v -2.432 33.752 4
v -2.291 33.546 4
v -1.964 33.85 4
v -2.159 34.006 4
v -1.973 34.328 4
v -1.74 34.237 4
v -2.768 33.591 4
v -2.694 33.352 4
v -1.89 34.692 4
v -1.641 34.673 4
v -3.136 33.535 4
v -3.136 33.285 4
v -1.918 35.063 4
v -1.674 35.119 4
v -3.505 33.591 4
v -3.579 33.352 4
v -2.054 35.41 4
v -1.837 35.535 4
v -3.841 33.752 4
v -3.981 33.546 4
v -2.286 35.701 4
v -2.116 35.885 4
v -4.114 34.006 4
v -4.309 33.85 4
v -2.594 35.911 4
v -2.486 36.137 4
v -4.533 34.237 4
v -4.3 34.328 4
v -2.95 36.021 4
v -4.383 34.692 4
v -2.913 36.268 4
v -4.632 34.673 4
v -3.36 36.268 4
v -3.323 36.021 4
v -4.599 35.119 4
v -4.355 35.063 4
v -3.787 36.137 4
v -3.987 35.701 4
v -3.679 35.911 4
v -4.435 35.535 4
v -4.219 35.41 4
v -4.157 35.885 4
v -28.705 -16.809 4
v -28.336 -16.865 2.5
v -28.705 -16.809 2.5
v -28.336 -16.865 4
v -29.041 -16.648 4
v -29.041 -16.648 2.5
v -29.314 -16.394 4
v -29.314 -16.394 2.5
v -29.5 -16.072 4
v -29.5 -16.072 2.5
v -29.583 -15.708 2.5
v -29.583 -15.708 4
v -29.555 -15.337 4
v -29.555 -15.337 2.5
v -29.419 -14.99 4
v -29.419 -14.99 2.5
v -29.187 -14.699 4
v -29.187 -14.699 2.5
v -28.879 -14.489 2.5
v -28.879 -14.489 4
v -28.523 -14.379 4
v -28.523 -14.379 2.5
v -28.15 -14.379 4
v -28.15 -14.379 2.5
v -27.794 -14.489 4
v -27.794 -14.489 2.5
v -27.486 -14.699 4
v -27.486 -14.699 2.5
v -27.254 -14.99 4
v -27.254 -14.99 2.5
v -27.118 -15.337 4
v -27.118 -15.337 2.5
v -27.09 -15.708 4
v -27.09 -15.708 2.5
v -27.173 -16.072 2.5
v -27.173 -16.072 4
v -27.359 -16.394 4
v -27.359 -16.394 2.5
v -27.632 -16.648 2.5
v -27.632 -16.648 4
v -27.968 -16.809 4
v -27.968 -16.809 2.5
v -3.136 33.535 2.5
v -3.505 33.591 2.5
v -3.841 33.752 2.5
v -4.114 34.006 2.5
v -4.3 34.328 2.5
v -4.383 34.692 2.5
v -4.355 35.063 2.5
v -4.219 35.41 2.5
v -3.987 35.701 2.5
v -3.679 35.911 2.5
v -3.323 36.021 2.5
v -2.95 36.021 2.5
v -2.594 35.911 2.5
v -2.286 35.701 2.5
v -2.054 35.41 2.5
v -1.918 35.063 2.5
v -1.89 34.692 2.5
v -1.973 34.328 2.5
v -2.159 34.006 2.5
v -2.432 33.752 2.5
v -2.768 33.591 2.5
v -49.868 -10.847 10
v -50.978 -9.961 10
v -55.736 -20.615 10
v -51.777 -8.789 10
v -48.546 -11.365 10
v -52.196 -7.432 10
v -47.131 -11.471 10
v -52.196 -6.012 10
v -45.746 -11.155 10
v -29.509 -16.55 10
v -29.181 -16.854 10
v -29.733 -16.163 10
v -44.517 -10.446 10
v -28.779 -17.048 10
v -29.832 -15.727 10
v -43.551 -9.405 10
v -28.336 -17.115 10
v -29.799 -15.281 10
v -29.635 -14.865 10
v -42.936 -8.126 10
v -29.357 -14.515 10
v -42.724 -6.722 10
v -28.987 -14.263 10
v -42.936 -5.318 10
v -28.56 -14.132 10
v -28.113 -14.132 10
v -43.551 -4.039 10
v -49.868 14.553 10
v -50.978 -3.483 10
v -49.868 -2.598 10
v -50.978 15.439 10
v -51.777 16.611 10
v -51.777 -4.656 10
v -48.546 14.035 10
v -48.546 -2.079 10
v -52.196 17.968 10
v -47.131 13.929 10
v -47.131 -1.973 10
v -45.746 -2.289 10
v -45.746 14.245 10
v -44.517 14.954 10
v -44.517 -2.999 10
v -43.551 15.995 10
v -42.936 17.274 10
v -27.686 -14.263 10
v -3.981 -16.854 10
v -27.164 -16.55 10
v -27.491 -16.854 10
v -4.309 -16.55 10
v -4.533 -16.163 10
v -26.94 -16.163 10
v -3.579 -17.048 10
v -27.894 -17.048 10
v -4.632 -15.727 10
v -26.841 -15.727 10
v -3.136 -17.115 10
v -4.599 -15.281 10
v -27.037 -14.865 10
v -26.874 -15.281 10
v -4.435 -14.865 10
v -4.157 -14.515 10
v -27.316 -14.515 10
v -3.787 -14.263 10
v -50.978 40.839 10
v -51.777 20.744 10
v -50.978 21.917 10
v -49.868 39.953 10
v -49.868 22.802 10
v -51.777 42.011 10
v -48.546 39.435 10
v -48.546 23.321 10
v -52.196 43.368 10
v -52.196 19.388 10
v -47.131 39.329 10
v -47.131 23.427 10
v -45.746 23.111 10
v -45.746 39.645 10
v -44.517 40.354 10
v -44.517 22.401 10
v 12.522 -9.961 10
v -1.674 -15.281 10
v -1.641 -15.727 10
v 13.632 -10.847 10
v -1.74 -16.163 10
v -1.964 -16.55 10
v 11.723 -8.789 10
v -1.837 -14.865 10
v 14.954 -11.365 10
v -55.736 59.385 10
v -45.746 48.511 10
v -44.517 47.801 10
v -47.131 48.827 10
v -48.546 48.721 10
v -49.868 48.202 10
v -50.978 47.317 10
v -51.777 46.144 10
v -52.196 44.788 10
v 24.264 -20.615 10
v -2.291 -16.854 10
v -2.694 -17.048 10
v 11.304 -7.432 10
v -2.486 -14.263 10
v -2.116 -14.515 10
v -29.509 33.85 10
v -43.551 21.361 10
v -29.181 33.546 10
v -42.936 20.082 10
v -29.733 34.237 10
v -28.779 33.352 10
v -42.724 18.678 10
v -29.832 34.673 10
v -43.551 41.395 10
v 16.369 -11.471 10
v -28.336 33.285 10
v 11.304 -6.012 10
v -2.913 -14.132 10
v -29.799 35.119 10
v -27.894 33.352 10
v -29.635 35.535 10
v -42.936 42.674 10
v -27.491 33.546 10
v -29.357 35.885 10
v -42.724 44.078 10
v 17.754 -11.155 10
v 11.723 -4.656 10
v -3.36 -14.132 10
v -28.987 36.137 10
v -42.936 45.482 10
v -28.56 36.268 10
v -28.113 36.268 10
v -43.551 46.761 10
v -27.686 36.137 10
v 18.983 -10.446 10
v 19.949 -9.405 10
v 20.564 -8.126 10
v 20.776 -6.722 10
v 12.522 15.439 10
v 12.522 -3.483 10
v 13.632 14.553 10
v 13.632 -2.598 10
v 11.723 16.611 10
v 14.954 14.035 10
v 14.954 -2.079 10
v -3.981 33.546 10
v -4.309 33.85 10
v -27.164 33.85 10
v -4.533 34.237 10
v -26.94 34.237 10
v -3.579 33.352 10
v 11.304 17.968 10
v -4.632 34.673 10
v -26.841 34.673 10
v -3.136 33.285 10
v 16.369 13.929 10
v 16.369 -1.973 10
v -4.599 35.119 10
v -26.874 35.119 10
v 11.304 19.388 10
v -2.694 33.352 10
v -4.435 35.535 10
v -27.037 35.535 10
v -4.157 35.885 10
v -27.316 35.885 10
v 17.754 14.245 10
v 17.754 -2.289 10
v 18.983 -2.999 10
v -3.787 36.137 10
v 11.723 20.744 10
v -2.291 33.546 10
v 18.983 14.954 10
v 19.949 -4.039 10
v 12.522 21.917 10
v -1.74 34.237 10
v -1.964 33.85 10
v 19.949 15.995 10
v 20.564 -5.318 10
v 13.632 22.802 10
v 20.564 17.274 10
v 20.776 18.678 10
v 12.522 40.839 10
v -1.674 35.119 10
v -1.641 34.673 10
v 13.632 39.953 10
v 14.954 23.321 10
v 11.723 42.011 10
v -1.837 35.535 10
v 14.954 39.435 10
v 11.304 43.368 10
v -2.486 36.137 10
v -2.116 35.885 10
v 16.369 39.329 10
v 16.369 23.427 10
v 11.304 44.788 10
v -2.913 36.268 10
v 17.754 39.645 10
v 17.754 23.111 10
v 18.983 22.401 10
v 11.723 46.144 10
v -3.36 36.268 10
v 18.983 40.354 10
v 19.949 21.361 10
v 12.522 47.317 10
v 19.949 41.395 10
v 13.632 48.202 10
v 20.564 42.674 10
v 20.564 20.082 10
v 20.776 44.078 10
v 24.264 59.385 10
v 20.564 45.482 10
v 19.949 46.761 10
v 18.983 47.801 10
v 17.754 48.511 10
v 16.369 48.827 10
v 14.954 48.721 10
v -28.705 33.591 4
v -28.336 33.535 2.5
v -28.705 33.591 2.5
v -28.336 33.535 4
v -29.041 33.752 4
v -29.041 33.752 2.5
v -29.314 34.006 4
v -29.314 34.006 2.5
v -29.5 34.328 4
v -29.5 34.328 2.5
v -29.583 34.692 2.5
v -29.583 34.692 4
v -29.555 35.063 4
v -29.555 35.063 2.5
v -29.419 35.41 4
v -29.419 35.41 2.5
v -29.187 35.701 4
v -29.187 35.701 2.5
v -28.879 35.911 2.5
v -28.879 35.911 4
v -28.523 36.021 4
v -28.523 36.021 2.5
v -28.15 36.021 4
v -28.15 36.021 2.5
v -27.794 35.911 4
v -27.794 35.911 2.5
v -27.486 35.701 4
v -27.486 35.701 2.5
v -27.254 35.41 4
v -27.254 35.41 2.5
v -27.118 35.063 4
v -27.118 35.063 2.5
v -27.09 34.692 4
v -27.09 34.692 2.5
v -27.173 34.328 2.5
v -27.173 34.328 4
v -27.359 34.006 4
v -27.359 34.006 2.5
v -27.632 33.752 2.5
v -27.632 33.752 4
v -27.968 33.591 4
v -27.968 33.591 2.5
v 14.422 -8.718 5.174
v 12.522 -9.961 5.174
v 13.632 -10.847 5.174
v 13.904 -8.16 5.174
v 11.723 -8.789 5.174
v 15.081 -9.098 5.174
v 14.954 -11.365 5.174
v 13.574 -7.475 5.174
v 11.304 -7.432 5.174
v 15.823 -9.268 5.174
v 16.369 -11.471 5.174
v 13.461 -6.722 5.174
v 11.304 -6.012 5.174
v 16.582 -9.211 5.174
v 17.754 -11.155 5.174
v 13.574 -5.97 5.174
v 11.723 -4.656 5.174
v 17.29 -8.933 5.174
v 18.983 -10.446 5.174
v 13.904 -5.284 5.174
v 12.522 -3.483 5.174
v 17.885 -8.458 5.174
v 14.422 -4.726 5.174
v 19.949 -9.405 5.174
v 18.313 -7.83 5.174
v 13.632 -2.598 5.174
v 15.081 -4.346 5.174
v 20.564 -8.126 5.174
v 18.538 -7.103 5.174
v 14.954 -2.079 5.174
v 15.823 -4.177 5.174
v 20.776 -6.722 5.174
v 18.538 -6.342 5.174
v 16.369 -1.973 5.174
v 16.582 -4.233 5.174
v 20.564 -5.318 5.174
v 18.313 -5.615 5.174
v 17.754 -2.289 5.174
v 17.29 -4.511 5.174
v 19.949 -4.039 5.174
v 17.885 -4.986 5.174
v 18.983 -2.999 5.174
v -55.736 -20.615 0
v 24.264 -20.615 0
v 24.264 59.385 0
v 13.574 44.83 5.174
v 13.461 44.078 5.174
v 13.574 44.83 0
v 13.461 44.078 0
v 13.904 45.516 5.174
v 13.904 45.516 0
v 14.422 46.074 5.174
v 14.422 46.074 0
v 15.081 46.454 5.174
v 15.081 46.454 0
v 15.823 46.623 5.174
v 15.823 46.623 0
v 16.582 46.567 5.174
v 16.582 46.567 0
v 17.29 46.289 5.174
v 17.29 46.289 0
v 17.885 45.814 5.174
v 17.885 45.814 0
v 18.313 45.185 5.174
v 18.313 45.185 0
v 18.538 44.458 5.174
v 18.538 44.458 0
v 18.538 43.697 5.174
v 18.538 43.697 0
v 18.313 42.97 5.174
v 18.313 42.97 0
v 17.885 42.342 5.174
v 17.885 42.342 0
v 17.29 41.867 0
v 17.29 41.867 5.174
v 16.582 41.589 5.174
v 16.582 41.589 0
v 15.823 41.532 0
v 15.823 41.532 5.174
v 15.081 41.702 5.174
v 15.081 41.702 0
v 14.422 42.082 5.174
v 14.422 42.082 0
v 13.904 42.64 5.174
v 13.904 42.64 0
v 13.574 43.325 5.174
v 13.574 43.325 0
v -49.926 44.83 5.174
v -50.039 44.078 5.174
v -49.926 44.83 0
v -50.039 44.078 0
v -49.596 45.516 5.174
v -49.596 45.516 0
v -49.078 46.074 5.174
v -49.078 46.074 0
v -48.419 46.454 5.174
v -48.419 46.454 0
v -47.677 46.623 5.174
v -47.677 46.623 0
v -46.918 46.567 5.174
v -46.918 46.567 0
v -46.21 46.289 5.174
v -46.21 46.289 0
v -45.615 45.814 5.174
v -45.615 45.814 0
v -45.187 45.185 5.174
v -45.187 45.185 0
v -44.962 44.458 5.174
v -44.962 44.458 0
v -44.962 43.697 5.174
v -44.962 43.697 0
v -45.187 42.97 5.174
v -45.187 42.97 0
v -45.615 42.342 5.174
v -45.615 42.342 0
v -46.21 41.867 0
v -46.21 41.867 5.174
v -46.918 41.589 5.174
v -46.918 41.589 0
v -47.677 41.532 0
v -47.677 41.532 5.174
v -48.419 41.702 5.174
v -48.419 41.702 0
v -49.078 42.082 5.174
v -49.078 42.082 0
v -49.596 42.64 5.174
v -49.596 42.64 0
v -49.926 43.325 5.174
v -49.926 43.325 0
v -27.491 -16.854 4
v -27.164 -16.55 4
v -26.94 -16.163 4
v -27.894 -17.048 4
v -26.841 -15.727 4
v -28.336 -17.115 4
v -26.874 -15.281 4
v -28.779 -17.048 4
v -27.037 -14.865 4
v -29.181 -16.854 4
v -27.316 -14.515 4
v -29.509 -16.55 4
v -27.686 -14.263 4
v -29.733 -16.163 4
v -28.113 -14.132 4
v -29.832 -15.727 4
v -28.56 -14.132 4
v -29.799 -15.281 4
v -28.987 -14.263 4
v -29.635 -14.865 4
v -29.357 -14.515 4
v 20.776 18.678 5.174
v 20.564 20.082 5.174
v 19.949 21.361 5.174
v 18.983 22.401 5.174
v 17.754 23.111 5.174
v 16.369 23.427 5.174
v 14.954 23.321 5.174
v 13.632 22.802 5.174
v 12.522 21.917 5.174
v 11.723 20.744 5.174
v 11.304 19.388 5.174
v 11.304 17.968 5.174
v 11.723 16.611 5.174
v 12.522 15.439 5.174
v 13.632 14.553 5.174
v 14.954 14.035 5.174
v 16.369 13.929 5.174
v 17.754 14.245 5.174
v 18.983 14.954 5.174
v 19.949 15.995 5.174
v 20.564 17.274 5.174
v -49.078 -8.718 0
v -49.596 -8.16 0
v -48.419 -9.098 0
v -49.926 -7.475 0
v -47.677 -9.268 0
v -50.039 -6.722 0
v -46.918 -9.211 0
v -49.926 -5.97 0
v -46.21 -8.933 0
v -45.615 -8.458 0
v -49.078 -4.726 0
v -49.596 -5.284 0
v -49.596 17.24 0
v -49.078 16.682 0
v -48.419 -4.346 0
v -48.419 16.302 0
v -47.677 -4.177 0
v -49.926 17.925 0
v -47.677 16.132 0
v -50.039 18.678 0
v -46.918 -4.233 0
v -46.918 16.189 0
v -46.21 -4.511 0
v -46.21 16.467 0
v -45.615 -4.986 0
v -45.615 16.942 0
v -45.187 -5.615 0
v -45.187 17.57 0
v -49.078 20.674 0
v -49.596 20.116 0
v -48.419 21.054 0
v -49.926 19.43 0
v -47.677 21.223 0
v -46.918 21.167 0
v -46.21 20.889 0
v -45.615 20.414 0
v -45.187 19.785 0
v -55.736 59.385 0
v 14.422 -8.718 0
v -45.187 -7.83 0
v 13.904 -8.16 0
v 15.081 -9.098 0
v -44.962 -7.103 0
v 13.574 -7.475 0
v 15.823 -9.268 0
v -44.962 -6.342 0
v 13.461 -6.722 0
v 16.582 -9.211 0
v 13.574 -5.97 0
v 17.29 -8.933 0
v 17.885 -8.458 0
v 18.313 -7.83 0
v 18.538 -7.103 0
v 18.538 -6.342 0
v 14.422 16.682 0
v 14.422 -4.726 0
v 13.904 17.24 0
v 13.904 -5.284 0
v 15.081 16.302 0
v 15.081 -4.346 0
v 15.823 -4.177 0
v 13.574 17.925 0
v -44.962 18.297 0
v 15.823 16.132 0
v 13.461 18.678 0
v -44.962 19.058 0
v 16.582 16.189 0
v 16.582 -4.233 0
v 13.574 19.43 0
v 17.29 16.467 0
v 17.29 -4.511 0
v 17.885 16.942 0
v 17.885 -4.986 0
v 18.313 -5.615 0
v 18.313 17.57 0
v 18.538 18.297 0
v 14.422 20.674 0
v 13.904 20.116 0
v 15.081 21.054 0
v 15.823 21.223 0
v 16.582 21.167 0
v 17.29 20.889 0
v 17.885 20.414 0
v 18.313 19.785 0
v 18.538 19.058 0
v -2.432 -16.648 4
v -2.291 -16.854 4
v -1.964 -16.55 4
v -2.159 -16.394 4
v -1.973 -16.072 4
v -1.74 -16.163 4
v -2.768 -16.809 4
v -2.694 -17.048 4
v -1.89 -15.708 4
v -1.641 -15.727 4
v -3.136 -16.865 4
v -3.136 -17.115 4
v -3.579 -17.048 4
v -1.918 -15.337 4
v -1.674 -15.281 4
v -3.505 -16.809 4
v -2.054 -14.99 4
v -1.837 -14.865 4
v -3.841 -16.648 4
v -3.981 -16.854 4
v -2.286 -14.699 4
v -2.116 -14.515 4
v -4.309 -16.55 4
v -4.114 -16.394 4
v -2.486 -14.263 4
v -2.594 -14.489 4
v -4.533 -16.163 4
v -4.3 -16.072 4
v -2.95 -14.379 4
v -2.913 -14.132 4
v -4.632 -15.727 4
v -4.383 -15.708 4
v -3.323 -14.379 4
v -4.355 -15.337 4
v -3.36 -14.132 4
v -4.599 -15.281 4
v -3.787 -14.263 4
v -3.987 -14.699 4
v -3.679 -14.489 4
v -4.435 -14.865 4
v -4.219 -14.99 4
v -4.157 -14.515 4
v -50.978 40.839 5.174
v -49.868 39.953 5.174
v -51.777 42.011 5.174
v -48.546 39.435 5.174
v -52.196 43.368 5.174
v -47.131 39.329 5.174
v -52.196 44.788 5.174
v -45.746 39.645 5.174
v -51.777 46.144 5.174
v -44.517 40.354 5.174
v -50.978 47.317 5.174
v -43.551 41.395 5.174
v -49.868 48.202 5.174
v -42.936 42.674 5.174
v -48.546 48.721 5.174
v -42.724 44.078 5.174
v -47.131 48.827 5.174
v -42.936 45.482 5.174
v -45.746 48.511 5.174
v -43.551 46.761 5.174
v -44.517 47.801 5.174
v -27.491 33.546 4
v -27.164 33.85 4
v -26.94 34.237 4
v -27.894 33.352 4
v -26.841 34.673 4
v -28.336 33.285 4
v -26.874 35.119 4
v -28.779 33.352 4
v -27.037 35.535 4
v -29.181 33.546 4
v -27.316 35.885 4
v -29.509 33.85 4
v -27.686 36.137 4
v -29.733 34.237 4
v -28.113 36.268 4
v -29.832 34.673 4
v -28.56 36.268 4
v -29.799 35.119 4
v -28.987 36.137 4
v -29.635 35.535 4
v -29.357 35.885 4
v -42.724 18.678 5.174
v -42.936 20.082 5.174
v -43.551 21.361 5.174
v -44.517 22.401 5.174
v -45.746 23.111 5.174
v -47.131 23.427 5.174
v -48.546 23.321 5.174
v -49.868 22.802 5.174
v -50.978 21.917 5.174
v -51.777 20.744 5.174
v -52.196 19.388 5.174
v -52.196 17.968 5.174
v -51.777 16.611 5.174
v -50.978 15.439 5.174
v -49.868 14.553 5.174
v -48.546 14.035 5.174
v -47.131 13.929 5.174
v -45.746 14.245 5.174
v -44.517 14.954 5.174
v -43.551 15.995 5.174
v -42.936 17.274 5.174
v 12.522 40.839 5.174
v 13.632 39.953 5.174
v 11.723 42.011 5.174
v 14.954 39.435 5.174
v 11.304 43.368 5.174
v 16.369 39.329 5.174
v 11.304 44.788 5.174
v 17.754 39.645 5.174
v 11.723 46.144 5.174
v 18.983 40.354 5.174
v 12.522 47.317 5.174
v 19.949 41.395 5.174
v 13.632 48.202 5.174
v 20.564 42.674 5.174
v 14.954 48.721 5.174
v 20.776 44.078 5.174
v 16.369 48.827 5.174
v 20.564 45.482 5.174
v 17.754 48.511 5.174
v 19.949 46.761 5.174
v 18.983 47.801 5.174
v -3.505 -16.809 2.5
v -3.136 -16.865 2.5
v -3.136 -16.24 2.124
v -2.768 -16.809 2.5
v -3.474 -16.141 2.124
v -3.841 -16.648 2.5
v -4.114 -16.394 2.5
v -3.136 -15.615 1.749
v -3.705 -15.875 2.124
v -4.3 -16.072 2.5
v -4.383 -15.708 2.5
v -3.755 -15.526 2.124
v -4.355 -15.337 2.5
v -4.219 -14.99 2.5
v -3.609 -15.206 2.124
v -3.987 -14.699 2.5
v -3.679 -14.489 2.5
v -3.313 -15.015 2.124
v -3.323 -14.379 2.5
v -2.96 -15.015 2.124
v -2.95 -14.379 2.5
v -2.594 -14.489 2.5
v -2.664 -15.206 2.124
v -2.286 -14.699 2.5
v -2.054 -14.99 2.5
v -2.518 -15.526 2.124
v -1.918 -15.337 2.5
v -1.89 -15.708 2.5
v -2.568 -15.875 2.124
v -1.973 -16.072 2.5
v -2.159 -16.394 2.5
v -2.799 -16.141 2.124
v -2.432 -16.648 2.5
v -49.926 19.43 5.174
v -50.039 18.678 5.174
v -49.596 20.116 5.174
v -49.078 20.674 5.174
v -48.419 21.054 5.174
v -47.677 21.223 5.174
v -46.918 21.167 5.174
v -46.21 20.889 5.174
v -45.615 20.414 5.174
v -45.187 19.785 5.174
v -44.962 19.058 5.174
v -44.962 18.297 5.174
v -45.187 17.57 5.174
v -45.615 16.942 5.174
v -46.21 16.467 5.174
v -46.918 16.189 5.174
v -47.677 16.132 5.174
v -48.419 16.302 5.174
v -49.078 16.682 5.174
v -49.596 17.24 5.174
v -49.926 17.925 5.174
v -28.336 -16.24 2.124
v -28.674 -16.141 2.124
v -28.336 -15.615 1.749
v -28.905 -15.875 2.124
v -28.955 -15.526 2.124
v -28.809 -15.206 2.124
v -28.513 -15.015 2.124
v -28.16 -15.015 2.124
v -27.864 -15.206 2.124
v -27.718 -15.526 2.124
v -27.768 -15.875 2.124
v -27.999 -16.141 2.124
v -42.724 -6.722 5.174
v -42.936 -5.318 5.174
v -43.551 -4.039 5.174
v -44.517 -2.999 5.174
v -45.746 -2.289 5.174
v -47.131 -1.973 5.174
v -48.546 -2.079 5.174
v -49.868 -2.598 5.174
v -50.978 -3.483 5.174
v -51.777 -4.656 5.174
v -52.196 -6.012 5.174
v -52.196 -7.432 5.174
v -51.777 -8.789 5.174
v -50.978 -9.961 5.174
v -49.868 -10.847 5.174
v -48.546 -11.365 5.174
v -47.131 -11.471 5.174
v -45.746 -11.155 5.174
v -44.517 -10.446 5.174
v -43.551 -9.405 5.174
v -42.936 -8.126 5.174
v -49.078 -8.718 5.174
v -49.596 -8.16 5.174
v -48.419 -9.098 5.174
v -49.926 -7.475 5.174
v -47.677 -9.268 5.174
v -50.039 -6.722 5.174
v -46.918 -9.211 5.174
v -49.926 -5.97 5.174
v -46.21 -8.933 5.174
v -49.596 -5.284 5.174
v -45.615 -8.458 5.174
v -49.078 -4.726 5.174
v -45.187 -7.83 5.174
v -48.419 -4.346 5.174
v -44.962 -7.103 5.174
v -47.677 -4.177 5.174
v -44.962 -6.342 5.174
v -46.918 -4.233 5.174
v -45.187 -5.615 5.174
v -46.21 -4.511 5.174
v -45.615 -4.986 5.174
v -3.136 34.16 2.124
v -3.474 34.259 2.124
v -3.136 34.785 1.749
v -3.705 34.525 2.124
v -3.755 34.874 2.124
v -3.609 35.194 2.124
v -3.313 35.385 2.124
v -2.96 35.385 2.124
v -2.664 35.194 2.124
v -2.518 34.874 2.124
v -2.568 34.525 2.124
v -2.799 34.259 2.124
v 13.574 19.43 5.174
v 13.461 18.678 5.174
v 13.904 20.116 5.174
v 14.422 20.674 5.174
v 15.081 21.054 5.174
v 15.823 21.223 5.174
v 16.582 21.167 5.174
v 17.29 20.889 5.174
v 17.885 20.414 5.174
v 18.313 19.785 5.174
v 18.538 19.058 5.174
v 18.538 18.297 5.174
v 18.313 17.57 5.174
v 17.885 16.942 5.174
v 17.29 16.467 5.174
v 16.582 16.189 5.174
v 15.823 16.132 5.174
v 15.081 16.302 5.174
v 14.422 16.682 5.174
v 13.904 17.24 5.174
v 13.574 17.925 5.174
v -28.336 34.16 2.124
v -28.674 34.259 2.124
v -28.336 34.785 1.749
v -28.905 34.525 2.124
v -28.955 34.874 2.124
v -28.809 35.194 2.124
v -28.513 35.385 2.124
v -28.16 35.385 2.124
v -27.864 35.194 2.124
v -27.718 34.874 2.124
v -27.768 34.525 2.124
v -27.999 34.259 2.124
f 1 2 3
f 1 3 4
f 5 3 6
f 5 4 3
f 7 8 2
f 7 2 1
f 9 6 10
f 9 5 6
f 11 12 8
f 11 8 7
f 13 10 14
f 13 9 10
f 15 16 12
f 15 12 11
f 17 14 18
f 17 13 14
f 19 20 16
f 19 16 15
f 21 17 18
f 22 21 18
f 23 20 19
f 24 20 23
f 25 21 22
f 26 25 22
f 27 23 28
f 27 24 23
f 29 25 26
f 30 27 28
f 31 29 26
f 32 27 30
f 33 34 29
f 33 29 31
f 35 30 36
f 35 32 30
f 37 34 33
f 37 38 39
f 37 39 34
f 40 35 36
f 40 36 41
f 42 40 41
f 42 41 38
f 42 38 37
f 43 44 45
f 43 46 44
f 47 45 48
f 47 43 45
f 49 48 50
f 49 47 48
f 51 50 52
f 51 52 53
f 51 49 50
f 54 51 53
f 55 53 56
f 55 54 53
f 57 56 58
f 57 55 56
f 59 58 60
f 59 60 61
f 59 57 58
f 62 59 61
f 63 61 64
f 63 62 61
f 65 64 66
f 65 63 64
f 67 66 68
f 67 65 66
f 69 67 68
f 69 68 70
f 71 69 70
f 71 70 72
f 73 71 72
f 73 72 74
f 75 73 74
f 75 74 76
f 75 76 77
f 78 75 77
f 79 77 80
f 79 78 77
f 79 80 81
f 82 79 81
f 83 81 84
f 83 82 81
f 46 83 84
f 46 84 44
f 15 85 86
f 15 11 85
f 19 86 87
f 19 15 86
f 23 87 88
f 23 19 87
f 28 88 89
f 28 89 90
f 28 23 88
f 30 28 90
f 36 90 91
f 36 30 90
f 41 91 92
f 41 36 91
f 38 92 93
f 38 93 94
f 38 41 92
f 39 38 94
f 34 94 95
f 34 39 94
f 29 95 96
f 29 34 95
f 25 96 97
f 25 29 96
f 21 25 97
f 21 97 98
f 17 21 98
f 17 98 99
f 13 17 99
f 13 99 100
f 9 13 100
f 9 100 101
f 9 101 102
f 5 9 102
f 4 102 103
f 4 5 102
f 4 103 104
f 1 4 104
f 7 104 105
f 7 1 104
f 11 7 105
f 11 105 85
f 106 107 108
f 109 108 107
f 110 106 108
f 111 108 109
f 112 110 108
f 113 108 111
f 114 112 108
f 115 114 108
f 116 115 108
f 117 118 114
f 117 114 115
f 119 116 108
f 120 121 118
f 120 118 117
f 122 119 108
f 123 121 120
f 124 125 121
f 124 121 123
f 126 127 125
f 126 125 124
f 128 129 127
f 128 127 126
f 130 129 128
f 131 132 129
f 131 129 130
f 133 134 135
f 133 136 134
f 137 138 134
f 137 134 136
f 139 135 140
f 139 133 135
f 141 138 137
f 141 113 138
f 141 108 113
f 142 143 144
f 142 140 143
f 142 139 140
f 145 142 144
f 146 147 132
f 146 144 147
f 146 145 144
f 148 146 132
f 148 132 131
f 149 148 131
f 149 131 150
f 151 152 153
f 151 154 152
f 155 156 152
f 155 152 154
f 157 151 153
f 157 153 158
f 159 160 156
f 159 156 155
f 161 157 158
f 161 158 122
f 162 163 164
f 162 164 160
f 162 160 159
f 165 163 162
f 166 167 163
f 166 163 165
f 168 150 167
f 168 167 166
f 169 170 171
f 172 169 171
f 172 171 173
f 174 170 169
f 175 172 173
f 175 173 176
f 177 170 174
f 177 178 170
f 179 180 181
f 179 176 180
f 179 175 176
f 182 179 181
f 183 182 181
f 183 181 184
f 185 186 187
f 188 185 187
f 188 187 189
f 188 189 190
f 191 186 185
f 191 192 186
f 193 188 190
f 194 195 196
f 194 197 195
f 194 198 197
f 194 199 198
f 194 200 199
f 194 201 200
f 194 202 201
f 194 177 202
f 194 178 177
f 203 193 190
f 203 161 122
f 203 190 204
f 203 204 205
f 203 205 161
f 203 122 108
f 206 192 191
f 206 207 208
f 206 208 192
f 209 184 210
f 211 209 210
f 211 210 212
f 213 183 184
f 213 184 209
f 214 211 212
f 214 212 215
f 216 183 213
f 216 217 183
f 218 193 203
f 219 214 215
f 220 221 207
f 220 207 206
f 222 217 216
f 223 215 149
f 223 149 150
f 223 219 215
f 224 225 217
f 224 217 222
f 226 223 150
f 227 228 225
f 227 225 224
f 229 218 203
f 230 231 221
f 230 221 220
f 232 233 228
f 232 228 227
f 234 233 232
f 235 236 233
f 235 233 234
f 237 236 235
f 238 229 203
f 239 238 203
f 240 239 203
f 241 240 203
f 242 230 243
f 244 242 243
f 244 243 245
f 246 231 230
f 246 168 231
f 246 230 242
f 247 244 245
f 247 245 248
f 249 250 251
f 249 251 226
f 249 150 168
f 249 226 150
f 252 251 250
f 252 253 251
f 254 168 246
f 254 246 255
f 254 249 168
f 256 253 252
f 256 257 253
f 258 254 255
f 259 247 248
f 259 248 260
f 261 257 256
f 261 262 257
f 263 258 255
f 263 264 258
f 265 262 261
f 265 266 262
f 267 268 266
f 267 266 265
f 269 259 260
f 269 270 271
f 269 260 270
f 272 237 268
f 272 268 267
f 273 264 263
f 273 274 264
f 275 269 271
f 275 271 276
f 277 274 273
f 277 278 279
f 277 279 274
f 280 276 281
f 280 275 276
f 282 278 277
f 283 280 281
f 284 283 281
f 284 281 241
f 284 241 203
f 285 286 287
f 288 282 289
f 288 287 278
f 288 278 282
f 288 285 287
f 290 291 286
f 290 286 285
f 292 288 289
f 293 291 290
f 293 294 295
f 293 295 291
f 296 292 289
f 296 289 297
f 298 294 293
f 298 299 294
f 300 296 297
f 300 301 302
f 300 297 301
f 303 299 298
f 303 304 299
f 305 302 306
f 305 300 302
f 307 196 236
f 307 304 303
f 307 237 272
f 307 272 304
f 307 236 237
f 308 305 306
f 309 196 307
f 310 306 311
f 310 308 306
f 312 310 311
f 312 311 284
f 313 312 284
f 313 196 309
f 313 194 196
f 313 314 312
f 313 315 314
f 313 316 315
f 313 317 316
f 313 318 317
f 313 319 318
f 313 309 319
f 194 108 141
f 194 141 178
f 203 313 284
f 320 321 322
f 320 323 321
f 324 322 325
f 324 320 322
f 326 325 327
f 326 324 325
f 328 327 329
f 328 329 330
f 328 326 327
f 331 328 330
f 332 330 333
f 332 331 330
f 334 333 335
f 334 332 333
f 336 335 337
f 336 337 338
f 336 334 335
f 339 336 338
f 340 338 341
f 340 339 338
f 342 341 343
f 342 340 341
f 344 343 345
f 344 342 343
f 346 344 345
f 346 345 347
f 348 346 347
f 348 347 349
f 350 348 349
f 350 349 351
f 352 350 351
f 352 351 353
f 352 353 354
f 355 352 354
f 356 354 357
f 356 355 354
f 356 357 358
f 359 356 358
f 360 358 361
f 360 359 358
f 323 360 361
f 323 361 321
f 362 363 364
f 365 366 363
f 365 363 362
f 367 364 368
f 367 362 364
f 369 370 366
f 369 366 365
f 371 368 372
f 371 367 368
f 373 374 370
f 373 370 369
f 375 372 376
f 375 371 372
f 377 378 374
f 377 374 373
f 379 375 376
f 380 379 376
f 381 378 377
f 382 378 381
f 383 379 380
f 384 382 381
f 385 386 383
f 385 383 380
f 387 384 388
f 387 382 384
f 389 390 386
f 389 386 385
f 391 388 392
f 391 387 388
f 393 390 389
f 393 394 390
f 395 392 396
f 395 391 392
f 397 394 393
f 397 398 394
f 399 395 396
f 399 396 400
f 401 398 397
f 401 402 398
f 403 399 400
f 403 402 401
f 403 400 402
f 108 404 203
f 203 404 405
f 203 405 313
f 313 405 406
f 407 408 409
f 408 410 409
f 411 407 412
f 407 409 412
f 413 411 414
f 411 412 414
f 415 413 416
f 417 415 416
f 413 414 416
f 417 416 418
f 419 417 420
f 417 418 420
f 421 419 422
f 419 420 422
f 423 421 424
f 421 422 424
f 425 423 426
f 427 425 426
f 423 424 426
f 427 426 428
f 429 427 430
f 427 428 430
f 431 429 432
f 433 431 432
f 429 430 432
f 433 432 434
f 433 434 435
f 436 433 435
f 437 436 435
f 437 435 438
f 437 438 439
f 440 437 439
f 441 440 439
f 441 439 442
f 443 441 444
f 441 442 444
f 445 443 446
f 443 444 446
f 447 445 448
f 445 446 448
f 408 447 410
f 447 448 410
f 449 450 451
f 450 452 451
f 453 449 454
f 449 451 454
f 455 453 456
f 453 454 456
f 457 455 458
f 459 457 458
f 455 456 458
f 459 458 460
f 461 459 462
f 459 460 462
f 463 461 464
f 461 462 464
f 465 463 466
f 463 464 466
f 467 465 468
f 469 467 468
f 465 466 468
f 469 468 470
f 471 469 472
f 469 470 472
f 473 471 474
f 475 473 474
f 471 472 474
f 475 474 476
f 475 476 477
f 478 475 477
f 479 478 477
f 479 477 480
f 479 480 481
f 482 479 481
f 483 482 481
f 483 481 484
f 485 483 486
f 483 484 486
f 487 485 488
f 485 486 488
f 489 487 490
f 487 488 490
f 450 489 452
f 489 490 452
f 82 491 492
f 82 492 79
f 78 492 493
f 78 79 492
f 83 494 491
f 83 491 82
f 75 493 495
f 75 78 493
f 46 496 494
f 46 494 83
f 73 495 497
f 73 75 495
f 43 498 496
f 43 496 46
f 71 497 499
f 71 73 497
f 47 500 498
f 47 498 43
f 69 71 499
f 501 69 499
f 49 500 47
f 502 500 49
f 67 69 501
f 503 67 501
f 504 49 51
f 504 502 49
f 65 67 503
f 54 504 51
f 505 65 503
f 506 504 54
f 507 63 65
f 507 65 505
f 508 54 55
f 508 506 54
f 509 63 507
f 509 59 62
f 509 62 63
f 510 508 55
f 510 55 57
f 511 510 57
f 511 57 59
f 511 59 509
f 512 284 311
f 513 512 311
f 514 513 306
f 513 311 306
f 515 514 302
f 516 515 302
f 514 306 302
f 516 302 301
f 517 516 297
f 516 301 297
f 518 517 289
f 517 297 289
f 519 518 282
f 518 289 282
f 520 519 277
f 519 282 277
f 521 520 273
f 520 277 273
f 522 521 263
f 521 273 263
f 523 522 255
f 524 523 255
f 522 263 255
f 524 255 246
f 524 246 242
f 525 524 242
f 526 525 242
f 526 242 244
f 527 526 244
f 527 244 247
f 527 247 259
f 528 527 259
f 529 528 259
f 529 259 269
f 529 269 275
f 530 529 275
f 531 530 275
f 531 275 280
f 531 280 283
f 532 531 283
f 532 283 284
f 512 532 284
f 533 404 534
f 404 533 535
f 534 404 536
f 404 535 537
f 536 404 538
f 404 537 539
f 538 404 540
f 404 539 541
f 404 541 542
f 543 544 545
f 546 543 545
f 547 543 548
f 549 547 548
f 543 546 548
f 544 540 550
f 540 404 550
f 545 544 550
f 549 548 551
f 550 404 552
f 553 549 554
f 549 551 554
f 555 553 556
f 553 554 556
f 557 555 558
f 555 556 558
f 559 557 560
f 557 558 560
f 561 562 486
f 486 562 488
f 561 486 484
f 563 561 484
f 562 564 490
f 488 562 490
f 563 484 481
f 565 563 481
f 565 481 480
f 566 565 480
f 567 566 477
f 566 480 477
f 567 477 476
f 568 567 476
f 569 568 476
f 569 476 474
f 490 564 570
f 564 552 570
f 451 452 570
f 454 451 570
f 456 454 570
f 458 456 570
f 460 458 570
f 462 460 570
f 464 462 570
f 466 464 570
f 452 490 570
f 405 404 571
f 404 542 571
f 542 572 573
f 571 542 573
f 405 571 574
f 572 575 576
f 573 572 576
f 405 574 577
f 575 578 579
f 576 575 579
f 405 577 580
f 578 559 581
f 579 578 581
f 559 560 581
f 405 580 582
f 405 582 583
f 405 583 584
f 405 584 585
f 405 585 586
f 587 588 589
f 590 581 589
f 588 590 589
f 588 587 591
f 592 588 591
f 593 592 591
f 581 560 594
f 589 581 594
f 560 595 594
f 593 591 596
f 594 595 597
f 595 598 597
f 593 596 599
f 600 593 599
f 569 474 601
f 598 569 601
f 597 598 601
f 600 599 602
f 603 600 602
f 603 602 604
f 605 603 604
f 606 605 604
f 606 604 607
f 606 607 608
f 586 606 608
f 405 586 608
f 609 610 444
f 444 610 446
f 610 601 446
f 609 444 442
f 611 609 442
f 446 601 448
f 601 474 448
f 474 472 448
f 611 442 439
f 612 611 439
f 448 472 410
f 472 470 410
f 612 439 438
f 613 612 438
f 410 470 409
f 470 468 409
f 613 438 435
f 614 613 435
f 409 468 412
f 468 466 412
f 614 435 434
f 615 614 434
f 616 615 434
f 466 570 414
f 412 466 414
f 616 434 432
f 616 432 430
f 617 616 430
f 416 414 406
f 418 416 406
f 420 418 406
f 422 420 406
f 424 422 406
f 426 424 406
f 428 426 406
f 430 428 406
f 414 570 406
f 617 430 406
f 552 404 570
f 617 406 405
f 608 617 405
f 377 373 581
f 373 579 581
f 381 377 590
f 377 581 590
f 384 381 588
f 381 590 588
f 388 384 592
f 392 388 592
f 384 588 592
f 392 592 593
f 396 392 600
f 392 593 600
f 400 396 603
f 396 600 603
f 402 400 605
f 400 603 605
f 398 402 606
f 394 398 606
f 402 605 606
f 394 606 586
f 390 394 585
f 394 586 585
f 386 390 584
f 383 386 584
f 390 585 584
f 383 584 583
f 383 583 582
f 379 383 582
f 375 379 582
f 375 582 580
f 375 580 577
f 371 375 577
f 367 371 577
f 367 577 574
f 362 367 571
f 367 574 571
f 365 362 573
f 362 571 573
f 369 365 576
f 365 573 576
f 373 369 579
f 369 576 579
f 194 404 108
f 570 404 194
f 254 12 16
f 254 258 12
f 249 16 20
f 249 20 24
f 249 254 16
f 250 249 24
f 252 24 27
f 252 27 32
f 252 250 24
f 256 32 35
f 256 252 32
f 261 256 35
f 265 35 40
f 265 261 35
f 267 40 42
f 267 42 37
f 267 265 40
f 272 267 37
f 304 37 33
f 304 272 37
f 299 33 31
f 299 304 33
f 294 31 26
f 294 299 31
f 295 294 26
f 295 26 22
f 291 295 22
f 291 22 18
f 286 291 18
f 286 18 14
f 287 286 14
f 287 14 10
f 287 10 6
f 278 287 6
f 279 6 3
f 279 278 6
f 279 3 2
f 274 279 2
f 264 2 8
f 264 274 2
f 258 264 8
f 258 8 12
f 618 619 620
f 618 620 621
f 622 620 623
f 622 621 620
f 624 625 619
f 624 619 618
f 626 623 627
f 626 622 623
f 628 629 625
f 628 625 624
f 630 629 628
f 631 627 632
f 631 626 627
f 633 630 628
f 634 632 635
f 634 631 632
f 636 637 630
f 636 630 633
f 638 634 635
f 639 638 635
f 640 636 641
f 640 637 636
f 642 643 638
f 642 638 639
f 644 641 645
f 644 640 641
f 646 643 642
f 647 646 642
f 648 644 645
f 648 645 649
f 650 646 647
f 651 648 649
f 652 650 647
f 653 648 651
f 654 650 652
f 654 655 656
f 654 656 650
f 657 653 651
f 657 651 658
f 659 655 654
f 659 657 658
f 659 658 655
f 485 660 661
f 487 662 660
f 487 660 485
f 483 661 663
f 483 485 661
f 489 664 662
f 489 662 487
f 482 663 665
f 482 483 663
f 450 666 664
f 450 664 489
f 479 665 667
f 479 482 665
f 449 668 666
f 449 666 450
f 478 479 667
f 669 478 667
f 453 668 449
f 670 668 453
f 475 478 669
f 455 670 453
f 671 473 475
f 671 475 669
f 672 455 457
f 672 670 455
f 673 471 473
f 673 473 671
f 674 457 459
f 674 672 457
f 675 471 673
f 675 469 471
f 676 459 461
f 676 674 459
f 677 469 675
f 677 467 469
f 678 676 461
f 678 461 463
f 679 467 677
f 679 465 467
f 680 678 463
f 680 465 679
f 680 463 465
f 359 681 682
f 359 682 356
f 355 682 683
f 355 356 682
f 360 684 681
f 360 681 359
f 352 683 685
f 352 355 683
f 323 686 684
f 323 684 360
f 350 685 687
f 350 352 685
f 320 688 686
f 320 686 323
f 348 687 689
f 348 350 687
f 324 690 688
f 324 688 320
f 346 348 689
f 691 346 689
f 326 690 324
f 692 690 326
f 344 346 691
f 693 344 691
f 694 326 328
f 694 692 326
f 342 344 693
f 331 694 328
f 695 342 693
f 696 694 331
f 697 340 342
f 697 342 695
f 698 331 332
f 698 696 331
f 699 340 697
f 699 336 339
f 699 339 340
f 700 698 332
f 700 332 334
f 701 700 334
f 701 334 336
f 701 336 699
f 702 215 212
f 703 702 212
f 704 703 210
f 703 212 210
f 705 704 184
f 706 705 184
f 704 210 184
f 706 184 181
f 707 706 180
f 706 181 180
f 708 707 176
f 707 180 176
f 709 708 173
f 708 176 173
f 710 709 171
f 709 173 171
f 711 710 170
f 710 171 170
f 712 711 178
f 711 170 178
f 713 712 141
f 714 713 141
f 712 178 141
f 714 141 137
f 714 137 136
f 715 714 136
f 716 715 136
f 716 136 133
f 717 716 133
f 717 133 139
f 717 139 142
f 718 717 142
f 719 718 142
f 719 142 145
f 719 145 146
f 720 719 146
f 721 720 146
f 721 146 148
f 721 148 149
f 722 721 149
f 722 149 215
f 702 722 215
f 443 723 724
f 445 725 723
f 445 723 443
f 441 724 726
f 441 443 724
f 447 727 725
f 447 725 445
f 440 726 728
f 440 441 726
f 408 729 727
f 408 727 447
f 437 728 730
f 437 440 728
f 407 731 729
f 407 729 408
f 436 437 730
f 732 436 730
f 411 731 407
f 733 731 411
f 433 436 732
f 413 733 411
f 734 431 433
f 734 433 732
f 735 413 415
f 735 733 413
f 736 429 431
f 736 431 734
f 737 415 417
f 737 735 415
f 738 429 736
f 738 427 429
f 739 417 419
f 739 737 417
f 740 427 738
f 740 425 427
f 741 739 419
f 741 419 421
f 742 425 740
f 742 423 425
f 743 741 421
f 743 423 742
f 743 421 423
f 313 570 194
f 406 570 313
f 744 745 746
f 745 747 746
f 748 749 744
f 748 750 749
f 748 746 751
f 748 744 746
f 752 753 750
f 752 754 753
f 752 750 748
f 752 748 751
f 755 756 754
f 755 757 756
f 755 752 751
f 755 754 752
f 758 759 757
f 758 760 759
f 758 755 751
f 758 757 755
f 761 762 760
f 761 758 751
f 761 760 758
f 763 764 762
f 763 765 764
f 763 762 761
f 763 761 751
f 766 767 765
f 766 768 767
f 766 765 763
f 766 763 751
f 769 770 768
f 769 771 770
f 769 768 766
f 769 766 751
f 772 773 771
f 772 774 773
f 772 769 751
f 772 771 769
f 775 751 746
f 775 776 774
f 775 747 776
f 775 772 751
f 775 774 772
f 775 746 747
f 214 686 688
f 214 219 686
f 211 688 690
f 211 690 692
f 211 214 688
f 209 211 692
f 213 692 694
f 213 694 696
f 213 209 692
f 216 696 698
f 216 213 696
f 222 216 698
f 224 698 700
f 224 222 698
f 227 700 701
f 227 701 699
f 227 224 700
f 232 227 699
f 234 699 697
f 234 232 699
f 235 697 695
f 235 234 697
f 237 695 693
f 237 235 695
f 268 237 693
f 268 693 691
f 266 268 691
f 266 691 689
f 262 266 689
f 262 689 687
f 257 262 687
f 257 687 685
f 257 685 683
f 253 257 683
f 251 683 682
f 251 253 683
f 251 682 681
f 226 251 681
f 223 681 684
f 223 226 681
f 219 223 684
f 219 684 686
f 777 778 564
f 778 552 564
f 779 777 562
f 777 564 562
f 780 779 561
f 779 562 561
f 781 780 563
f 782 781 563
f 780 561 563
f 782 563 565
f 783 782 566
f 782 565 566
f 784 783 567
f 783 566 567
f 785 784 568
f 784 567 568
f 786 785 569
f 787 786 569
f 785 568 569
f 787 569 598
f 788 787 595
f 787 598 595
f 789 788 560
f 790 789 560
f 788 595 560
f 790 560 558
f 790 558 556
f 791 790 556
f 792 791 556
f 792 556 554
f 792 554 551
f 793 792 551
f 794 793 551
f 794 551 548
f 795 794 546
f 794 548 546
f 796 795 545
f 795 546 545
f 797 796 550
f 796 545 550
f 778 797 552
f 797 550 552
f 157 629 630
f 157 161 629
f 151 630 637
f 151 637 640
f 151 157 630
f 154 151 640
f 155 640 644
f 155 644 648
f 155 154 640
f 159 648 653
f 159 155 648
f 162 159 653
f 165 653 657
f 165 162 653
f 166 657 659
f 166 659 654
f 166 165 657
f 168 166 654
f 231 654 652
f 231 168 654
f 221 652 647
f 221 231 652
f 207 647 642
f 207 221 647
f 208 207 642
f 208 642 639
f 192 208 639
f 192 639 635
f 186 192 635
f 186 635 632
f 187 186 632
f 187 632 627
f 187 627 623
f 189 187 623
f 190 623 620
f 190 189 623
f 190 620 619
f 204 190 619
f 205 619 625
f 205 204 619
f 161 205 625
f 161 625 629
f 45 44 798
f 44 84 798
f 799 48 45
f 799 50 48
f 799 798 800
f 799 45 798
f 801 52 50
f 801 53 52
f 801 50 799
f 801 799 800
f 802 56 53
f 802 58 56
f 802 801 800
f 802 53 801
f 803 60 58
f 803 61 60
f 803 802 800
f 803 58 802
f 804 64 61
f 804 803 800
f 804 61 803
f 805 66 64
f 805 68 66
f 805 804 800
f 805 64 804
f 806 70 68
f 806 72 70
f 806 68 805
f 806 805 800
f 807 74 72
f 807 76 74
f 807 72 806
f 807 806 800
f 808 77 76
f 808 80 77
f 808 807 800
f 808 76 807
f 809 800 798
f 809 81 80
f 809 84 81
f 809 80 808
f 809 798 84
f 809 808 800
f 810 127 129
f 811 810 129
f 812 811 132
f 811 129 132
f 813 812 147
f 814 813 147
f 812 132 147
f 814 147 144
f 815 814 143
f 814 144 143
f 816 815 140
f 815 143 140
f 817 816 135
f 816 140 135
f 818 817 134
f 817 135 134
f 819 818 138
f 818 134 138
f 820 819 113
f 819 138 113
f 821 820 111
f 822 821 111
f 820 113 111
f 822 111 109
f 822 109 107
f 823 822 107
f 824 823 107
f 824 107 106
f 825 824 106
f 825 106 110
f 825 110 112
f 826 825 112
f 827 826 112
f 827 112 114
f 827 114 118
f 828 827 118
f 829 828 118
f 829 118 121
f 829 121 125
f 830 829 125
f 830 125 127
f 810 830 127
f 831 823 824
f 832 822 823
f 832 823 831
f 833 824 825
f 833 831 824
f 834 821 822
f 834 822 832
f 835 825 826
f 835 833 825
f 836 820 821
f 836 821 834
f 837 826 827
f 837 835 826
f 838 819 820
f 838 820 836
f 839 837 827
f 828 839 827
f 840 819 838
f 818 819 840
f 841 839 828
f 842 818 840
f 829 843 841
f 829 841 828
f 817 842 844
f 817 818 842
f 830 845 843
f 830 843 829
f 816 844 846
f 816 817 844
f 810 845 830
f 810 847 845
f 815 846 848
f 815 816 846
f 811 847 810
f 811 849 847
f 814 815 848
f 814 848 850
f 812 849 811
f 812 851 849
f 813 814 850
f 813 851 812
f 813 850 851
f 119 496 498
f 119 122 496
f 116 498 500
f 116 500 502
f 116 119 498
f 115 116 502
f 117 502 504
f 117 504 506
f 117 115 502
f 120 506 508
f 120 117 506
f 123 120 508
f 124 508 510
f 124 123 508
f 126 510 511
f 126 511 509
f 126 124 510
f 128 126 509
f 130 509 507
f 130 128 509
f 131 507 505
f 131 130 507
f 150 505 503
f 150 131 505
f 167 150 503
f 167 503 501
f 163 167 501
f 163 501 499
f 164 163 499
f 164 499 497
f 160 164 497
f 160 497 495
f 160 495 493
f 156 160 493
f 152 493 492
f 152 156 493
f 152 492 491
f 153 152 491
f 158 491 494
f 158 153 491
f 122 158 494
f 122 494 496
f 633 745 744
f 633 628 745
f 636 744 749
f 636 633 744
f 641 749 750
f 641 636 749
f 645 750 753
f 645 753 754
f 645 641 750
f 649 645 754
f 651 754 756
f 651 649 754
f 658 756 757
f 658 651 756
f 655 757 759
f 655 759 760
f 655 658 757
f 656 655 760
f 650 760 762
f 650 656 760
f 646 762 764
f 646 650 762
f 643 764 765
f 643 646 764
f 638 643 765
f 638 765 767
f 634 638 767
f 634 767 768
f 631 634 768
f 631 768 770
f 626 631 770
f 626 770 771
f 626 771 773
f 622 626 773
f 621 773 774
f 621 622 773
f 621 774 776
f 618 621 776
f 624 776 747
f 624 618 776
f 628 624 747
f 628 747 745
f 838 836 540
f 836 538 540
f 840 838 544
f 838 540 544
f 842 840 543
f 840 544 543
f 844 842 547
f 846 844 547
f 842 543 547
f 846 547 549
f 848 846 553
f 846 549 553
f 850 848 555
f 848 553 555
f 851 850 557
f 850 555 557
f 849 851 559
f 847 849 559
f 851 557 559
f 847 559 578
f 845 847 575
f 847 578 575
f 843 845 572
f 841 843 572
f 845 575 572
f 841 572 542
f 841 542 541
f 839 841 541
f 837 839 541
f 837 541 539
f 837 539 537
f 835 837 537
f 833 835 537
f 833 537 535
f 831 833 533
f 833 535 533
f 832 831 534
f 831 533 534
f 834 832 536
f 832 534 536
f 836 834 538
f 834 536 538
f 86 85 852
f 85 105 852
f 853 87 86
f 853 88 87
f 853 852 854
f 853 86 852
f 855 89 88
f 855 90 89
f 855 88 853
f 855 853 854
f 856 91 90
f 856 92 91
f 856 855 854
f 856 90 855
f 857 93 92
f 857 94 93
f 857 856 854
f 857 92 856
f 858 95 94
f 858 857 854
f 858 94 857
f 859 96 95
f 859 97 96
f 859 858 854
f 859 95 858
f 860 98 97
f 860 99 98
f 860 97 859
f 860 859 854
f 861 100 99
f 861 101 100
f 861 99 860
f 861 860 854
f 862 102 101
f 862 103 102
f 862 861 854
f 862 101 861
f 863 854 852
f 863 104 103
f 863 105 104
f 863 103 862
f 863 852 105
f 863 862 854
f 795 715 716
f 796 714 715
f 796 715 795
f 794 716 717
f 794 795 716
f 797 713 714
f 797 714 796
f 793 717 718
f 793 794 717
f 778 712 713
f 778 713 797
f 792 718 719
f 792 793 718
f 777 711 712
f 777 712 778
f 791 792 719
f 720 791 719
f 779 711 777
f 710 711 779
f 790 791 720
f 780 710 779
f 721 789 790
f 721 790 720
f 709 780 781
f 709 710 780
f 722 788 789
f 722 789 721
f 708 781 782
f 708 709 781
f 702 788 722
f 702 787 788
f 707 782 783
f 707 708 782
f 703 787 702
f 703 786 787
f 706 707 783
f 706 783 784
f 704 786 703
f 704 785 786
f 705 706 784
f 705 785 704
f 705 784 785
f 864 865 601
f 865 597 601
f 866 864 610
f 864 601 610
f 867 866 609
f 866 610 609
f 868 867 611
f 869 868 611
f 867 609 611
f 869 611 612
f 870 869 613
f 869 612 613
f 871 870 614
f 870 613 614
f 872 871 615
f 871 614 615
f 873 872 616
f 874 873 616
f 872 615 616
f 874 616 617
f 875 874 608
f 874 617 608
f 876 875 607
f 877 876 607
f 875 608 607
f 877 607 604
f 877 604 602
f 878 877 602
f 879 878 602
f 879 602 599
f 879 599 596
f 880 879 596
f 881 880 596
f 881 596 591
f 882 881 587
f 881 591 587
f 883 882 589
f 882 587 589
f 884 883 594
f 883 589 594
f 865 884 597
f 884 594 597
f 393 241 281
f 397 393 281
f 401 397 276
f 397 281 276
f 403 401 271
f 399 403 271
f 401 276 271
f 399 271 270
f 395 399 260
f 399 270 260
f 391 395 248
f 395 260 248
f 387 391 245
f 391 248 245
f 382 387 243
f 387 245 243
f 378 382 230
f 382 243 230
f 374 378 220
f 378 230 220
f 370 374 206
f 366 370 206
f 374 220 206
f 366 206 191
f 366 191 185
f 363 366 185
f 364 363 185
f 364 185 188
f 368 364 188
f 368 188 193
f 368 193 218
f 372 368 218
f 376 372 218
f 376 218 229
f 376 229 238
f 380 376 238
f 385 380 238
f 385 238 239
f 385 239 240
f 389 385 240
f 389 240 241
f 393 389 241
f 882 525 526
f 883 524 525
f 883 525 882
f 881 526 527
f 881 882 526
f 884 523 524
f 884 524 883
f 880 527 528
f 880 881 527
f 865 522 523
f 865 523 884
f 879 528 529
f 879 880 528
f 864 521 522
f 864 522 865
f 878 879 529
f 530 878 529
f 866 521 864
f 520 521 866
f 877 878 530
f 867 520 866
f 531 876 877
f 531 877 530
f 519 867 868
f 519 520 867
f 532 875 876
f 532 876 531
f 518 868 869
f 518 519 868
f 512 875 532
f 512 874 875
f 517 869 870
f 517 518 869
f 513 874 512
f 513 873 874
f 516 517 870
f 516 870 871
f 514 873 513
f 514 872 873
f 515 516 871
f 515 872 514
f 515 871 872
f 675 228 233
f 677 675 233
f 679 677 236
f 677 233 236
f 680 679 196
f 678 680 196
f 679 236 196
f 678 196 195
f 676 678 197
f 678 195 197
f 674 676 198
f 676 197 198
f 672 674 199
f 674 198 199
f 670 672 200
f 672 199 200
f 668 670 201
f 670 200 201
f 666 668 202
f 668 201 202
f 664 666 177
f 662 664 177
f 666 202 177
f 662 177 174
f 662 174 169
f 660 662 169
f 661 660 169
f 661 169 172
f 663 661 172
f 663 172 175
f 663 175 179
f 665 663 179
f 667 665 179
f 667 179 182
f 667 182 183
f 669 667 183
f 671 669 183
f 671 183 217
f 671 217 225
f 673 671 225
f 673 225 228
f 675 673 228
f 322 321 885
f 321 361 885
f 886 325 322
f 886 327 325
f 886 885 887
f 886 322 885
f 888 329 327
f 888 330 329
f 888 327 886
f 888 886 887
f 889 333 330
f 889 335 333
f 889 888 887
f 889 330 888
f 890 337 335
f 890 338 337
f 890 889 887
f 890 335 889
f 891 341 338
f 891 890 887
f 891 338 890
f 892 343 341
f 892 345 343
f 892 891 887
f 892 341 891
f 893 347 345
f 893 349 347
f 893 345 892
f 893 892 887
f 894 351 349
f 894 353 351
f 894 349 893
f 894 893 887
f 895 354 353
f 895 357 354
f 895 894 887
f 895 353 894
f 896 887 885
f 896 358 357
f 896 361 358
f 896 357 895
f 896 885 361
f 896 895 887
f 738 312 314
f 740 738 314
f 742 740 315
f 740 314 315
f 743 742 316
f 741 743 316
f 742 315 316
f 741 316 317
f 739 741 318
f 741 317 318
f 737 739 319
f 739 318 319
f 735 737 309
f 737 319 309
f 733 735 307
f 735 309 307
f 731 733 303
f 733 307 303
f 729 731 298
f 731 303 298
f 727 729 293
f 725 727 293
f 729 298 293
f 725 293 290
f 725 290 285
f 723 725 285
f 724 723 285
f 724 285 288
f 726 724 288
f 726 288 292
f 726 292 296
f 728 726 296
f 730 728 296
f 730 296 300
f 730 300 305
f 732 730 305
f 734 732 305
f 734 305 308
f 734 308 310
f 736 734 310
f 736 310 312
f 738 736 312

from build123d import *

# Parameters (mm, degrees)
SKETCH1_W                                       = 80
SKETCH1_H                                       = 80
EXTRUDE1_DEPTH                                  = 10
CBORE_FOR_10_SOCKET_HEAD_CAP_SCREW2_D           = 5.1054
CBORE_FOR_10_SOCKET_HEAD_CAP_SCREW2_CBORE_D     = 9.525
CBORE_FOR_10_SOCKET_HEAD_CAP_SCREW2_CBORE_DEPTH = 4.826
M3X0_5_TAPPED_HOLE1_AT_2_COUNT                  = 2
M3X0_5_TAPPED_HOLE1_AT_2_PITCH                  = 50.4
LPATTERN4_COUNT                                 = 2
LPATTERN4_PITCH                                 = 25.2


with BuildPart() as part:
    # Sketch1 → Extrude1 (new body)
    with BuildSketch(Plane.XY):
        with Locations((-15.736421911, 19.385081585)):
            Rectangle(SKETCH1_W, SKETCH1_H)
    extrude(amount=EXTRUDE1_DEPTH)

    # CBORE for #10 Socket Head Cap Screw2 (through all)
    with Locations(Plane(origin=(-47.486421911, 44.077855478, 10), x_dir=(1, 0, 0), z_dir=(0, 0, 1))):
        with Locations((0, 0), (0, -25.4), (0, -50.8), (63.5, -50.8), (63.5, -25.4), (63.5, 0)):
            CounterBoreHole(CBORE_FOR_10_SOCKET_HEAD_CAP_SCREW2_D / 2, CBORE_FOR_10_SOCKET_HEAD_CAP_SCREW2_CBORE_D / 2, CBORE_FOR_10_SOCKET_HEAD_CAP_SCREW2_CBORE_DEPTH)

    # Sketch4 → M3x0.5 Tapped Hole1 (revolve, cut)
    with BuildSketch(Plane(origin=(-28.336421911, 34.785081585, 10), x_dir=(0, -1, 0), z_dir=(1, 0, 0))):
        Polygon((0, 0), (0, 8.251075774), (1.25, 7.5), (1.25, 6), (1.5, 6), (1.5, 0), align=None)
    m3x0_5_tapped_hole1 = revolve(axis=Axis((-28.336421911, 34.785081585, 16.35), (0, 0, -1)), mode=Mode.SUBTRACT)

    # M3x0.5 Tapped Hole1 at 2: M3x0.5 Tapped Hole1 ×2
    with Locations(*[(0, -i * M3X0_5_TAPPED_HOLE1_AT_2_PITCH, 0) for i in range(1, M3X0_5_TAPPED_HOLE1_AT_2_COUNT)]):
        add(m3x0_5_tapped_hole1, mode=Mode.SUBTRACT)

    # LPattern4: M3x0.5 Tapped Hole1 ×2
    with Locations(*[(i * LPATTERN4_PITCH, 0, 0) for i in range(1, LPATTERN4_COUNT)]):
        add(m3x0_5_tapped_hole1, mode=Mode.SUBTRACT)

    # LPattern4 copy 1 sketch → LPattern4 copy 1 (revolve, cut)
    with BuildSketch(Plane(origin=(-3.136421911, -15.614918415, 10), x_dir=(0, -1, 0), z_dir=(1, 0, 0))):
        Polygon((0, 0), (0, 8.251075774), (1.25, 7.5), (1.25, 6), (1.5, 6), (1.5, 0), align=None)
    revolve(axis=Axis((-3.136421911, -15.614918415, 16.35), (0, 0, -1)), mode=Mode.SUBTRACT)


solid = part.part
